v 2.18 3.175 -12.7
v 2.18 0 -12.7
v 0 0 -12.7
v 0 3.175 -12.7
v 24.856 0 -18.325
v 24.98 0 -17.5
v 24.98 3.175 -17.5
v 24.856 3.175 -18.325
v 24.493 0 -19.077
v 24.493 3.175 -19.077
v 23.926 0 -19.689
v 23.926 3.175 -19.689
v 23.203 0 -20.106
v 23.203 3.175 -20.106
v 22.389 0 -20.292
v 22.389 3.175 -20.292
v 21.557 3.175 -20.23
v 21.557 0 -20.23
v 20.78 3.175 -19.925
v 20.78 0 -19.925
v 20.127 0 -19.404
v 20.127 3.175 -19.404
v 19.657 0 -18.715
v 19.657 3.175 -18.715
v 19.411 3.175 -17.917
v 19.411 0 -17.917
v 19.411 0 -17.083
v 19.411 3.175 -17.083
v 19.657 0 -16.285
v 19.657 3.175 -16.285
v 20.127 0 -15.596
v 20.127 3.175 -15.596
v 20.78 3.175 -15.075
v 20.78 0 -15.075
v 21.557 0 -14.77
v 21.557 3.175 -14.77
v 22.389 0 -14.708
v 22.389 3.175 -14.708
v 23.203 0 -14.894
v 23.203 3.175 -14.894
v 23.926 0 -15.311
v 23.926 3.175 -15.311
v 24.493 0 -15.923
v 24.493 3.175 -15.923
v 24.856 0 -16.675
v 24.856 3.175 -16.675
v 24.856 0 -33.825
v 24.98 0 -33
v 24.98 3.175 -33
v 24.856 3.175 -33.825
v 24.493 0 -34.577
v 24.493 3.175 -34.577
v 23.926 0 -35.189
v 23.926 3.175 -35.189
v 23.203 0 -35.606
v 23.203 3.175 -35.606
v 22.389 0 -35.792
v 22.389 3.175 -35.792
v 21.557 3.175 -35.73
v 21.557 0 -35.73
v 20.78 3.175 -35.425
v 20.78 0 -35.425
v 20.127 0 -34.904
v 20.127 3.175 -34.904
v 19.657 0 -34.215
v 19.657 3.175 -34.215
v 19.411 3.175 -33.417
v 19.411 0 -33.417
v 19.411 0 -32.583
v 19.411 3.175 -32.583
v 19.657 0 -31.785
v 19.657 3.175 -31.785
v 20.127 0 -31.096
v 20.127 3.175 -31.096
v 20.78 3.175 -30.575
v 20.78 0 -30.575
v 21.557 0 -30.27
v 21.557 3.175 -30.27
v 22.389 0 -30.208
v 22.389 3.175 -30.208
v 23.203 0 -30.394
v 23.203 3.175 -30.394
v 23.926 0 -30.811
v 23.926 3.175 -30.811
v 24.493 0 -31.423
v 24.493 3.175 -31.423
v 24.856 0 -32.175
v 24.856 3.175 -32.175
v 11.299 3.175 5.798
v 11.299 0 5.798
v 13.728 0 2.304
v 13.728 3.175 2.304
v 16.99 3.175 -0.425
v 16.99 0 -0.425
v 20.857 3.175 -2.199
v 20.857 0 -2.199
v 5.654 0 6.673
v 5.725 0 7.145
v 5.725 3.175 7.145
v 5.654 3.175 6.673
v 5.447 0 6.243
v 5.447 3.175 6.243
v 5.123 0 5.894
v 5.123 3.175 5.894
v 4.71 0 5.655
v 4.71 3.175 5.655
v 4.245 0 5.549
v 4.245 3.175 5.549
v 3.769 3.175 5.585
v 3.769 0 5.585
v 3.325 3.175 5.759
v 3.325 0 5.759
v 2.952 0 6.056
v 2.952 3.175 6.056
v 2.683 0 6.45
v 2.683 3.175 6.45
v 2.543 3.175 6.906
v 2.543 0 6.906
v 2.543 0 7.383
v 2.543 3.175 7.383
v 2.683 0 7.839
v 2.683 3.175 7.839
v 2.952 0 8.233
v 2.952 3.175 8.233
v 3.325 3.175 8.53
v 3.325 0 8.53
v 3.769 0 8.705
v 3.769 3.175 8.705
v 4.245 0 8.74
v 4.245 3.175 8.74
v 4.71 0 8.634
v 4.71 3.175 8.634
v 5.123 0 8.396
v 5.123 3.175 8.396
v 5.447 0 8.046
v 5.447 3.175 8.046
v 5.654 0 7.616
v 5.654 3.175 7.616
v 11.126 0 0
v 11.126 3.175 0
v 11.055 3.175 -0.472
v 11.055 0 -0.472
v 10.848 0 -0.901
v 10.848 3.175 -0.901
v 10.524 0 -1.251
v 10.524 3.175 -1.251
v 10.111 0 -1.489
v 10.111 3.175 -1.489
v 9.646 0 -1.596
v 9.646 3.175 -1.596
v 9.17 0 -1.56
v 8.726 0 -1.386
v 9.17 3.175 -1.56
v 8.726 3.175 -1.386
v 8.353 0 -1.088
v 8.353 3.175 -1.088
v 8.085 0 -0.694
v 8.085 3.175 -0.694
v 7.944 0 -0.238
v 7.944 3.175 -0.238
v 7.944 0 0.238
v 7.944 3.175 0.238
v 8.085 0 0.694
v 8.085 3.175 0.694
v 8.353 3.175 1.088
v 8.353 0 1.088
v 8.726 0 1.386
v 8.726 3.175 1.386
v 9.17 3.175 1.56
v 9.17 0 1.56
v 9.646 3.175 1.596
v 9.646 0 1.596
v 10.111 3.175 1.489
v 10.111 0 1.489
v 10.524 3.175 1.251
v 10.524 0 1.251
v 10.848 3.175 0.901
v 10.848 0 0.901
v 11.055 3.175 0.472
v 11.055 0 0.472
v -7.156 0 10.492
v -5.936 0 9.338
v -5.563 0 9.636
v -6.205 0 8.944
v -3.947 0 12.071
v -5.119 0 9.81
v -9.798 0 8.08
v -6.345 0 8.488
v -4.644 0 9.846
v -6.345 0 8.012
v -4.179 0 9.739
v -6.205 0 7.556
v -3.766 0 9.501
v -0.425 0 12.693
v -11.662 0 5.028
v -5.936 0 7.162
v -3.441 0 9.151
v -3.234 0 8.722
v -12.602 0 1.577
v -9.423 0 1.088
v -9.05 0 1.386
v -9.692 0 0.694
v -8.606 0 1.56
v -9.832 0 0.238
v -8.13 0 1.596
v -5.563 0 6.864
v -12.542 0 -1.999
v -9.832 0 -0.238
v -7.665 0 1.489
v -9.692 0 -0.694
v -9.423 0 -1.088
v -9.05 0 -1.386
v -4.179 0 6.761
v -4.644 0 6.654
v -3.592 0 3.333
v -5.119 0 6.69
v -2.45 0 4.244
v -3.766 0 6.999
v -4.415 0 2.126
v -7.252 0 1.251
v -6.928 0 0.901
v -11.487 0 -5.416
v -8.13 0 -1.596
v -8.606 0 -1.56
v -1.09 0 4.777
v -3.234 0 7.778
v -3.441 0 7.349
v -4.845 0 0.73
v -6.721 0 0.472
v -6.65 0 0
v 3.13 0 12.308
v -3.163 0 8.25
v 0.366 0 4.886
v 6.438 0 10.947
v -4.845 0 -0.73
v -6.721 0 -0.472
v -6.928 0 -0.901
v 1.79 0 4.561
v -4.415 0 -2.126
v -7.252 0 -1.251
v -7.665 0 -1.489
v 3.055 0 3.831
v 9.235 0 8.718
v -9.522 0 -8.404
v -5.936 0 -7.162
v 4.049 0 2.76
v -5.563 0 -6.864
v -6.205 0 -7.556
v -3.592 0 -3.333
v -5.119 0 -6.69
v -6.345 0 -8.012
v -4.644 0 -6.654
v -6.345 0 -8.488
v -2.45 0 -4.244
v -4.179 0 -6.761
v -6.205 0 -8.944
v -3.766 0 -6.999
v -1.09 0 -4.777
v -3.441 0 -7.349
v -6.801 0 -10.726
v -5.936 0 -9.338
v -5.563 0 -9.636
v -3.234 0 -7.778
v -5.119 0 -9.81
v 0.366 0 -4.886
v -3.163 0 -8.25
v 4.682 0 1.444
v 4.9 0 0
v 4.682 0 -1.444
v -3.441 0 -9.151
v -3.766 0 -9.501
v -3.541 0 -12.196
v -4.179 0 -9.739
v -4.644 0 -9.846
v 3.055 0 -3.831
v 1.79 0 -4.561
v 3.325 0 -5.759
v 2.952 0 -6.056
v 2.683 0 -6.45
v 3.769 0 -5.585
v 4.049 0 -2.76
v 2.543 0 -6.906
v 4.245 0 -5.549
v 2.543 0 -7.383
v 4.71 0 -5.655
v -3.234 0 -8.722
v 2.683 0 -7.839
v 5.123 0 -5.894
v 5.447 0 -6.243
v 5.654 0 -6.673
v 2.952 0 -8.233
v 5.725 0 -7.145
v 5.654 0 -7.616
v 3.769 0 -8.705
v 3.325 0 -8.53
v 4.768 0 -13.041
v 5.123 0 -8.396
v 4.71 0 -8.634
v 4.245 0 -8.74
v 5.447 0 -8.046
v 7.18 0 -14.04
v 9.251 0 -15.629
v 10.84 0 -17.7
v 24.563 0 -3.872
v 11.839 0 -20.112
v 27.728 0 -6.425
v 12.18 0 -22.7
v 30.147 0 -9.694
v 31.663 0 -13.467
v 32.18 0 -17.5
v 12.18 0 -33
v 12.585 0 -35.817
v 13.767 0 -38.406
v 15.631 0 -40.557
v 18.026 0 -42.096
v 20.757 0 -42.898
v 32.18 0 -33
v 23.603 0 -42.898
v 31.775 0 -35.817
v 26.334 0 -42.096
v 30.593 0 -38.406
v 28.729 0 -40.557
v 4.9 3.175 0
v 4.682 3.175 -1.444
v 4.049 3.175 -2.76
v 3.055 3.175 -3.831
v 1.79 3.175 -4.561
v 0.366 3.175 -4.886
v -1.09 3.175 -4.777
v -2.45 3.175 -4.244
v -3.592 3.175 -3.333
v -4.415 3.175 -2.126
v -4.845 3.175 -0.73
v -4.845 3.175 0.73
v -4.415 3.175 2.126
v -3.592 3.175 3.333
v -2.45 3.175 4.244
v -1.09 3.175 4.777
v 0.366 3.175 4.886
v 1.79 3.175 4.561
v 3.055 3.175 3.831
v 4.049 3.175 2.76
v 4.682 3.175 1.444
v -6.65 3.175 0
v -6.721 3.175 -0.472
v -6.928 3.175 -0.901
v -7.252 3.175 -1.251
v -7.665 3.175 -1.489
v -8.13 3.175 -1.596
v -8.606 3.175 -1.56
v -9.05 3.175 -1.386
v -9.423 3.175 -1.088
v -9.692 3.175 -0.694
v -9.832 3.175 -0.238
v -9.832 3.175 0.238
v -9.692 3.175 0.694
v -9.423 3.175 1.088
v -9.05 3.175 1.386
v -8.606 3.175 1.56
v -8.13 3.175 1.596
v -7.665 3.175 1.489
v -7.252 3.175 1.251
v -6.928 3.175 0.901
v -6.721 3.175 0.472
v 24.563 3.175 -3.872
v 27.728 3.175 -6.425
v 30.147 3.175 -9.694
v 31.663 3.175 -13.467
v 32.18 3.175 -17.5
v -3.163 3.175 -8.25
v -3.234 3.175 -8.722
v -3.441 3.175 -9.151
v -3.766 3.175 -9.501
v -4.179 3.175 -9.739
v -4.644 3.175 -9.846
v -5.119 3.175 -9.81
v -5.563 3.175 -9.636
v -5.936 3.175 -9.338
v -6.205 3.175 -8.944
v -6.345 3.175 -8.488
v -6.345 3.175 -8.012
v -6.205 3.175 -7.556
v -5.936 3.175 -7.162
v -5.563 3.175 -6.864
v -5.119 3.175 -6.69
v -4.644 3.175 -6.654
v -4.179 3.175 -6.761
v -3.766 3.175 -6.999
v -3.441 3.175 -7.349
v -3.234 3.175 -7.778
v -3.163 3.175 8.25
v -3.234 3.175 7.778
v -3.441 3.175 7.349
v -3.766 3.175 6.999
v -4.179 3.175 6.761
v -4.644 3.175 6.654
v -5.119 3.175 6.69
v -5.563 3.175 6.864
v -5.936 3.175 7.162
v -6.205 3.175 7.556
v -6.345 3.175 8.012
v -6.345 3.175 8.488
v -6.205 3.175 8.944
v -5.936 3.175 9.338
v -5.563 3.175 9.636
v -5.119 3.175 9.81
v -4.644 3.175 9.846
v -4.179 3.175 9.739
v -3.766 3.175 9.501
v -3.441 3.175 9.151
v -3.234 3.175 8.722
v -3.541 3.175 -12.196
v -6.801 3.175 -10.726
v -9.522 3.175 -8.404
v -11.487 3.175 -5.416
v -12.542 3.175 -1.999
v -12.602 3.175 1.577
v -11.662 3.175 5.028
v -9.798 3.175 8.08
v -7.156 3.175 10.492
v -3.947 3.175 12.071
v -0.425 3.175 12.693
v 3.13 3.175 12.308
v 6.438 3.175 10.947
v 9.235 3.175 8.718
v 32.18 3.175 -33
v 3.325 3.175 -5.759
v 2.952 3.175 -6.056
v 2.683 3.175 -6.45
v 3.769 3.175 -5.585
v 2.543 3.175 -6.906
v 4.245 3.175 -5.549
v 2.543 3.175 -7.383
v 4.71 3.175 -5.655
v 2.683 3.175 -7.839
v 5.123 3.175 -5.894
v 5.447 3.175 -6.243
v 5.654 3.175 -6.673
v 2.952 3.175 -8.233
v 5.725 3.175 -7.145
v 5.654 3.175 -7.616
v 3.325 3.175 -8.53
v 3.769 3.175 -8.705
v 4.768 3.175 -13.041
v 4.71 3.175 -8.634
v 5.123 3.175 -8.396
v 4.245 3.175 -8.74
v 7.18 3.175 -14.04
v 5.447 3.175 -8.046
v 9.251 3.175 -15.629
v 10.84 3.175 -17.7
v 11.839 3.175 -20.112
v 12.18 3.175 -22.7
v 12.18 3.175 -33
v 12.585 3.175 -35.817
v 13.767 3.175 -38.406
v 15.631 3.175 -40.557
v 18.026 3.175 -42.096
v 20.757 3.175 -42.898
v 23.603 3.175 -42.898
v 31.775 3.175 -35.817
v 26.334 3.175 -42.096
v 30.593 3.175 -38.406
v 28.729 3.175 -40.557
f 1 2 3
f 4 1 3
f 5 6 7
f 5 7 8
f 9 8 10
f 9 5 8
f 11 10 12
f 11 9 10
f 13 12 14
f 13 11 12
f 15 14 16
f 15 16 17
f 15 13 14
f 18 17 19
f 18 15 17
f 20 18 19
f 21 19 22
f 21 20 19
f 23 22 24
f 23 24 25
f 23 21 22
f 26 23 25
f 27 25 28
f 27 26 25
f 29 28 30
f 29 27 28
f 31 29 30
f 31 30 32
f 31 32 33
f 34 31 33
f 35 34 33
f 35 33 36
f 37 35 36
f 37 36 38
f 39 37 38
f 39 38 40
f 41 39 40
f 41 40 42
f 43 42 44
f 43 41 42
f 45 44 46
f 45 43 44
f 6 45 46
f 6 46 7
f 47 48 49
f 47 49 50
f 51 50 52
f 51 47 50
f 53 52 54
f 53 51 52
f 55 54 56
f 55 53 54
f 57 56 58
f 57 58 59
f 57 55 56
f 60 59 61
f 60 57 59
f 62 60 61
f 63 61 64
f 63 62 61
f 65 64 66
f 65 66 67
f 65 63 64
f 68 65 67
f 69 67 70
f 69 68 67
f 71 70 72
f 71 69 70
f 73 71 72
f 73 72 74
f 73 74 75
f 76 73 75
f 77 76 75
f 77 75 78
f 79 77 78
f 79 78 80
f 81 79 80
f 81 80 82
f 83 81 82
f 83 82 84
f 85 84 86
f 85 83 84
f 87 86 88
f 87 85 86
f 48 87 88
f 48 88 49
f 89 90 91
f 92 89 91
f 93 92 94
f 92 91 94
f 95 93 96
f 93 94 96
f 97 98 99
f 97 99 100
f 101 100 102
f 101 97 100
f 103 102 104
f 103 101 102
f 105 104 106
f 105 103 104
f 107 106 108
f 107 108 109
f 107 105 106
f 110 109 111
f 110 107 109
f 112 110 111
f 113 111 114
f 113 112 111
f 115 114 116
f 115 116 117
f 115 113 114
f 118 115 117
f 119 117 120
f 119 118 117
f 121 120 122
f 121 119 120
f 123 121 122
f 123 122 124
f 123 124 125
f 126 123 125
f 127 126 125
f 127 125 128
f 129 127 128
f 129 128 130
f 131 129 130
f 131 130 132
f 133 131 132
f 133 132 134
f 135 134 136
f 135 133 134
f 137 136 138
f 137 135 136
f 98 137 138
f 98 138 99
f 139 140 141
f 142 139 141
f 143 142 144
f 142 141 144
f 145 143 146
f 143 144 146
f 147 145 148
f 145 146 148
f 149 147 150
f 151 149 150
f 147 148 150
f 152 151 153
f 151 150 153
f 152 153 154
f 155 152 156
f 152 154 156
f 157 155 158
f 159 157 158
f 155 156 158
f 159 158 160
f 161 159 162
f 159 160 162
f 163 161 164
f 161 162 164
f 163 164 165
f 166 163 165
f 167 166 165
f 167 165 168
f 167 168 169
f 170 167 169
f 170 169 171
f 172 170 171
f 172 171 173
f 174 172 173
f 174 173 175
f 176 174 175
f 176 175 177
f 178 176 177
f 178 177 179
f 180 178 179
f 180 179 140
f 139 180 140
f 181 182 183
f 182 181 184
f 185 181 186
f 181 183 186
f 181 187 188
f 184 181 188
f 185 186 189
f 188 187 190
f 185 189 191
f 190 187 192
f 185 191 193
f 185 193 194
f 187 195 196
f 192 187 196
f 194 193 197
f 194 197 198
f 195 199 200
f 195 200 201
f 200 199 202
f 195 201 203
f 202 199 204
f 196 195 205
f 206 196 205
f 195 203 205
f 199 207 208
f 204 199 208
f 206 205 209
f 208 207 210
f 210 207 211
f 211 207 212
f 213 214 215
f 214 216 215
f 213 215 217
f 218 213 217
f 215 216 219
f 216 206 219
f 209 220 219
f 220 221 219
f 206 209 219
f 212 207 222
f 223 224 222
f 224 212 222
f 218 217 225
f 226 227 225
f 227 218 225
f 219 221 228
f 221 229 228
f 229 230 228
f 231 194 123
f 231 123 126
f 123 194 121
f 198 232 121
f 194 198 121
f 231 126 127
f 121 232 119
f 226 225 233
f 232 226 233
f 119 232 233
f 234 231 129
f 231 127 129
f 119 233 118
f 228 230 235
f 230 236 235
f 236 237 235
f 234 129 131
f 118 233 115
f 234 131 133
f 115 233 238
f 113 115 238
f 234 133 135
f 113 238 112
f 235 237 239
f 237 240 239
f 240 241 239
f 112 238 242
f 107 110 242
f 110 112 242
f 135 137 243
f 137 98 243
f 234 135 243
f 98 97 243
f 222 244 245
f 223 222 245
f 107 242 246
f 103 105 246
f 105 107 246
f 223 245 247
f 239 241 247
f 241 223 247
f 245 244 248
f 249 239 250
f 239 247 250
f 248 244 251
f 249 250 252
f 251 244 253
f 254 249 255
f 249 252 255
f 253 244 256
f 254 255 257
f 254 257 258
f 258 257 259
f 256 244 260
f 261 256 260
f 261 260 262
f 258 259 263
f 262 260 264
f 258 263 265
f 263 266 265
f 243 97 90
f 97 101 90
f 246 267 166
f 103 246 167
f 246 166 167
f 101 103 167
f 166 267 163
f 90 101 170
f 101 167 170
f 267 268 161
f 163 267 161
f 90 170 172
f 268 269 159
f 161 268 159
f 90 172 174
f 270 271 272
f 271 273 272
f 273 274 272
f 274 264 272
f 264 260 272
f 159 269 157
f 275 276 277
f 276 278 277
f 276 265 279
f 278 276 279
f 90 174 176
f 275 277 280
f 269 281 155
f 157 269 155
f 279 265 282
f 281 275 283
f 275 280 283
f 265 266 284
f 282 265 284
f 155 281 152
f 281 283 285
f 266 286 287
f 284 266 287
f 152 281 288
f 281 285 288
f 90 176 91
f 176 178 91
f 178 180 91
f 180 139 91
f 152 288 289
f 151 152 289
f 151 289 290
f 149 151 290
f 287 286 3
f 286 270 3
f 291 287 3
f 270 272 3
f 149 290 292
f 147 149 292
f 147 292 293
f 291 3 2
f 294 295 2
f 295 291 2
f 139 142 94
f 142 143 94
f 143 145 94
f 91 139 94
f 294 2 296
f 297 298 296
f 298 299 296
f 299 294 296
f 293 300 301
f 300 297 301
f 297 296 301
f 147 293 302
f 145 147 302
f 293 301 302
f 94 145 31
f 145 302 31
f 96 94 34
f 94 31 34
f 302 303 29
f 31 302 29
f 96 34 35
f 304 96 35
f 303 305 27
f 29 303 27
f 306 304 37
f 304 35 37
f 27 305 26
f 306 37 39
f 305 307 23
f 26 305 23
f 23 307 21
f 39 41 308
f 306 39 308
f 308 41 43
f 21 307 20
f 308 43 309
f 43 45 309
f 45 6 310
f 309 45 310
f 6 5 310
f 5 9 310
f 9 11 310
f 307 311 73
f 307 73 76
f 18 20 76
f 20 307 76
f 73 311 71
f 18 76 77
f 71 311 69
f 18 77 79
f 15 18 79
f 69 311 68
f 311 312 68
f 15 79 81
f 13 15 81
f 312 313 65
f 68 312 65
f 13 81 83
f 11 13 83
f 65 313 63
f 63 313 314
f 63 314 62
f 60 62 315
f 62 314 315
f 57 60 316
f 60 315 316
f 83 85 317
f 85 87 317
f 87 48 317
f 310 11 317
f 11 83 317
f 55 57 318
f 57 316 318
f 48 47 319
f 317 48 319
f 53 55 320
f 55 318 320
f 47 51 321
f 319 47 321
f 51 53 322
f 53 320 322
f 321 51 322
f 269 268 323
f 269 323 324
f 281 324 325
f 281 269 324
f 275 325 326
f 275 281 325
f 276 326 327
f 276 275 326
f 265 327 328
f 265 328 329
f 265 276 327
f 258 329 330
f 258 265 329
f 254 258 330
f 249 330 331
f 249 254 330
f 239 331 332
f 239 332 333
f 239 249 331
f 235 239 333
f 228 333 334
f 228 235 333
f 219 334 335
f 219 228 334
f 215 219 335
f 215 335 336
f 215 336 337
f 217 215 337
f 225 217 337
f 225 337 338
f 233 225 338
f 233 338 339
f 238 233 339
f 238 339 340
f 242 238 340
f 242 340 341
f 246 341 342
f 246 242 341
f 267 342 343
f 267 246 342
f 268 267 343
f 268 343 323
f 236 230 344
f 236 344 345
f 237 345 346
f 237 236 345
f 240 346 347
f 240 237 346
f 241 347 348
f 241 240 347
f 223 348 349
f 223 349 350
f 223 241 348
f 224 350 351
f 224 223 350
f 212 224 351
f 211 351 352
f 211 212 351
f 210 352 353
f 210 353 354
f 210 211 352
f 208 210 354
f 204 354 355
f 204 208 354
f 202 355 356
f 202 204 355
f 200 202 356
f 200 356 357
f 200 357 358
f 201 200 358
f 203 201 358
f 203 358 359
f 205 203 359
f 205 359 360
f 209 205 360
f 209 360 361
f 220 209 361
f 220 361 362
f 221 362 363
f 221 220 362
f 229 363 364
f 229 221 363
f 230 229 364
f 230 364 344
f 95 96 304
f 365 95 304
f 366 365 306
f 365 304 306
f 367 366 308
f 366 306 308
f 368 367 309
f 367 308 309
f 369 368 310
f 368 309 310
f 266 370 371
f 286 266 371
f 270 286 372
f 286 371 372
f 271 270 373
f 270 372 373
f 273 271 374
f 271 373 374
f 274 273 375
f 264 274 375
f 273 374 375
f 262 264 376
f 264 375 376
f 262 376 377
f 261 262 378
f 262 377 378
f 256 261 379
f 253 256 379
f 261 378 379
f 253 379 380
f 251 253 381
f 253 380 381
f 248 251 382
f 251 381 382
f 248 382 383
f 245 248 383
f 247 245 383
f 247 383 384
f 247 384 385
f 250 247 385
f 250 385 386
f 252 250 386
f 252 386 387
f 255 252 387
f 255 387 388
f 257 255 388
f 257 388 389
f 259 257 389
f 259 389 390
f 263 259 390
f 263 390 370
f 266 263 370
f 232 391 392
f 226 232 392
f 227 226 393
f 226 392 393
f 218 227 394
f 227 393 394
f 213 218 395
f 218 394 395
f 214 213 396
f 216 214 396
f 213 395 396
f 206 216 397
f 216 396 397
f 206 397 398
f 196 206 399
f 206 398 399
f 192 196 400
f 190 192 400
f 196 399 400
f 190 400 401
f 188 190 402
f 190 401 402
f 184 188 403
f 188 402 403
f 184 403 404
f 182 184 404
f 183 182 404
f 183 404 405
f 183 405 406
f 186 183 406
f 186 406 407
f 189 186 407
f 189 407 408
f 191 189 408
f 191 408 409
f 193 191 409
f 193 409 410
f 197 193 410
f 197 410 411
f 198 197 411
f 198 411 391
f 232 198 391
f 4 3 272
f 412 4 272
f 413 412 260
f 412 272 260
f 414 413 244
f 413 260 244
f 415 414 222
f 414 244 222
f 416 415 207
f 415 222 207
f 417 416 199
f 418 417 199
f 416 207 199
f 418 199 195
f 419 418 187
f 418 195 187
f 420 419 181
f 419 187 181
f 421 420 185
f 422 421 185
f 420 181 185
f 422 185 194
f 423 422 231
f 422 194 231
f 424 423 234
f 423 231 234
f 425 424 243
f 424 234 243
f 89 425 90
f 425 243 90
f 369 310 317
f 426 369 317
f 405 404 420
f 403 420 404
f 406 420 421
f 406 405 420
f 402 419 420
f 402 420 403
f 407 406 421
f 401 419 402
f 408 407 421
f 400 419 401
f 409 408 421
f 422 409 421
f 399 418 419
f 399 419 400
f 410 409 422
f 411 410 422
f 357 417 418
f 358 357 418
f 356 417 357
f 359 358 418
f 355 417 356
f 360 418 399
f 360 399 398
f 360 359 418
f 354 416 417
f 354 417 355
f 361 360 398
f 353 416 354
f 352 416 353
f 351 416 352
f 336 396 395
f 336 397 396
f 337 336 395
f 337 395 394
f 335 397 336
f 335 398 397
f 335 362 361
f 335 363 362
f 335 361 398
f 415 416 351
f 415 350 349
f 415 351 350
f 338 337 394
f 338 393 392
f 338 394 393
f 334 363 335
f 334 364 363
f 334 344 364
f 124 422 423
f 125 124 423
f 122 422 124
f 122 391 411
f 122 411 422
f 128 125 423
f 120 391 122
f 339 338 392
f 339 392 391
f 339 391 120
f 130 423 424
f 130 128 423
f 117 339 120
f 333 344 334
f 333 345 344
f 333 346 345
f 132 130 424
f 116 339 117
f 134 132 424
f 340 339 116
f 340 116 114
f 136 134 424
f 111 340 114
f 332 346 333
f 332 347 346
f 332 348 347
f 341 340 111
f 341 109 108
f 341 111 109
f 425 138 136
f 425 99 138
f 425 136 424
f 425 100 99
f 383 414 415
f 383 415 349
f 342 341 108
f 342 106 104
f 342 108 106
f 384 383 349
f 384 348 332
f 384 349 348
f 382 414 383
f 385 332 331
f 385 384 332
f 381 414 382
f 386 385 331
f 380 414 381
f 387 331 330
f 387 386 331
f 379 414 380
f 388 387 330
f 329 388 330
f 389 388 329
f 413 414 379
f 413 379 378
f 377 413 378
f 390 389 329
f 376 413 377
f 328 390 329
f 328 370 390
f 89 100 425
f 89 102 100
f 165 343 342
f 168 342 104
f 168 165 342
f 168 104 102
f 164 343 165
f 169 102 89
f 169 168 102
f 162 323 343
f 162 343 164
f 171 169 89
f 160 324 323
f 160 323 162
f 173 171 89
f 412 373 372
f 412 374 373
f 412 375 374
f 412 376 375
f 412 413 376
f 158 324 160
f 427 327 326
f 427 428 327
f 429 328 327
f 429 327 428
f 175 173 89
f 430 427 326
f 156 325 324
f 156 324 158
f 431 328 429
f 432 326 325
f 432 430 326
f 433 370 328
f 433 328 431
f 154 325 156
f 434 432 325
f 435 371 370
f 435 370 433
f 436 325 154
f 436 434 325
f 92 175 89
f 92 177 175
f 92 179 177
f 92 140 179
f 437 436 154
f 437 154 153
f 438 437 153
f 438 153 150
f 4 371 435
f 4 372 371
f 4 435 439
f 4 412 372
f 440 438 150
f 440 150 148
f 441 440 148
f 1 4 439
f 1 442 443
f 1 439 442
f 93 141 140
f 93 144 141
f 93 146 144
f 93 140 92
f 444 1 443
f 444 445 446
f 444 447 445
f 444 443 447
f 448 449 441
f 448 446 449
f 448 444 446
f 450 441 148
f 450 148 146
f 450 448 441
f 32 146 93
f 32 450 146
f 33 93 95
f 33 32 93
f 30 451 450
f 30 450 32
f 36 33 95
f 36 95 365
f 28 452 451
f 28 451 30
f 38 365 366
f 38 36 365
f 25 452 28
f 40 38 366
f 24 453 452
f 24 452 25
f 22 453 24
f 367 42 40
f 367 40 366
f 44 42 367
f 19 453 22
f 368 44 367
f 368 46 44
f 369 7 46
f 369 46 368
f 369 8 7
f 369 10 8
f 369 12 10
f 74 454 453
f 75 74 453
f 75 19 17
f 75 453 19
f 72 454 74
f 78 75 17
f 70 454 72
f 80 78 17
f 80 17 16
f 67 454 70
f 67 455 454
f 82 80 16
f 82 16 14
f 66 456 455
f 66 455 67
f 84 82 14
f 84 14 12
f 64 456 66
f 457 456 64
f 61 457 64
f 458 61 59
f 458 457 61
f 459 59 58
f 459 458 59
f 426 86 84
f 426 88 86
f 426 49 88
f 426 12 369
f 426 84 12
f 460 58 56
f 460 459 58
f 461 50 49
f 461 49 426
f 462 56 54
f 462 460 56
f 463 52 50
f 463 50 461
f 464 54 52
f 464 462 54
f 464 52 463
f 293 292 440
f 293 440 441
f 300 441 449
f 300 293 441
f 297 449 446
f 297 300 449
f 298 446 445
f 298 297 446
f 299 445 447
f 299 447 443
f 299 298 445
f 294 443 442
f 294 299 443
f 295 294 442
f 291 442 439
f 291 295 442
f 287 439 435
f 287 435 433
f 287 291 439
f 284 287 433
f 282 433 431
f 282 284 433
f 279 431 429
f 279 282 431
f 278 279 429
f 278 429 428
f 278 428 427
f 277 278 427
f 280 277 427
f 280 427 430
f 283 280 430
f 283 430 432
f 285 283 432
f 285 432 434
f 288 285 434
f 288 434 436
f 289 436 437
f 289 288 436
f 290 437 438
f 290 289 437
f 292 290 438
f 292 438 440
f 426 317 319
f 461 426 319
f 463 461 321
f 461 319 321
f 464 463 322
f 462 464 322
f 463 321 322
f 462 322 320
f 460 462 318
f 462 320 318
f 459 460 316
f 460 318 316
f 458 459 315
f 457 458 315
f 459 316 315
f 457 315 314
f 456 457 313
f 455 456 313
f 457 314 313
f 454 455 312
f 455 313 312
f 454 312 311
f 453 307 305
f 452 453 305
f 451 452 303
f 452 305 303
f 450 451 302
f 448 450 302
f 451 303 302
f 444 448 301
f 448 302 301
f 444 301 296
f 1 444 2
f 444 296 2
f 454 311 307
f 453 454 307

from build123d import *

# Parameters (mm, degrees)
SKETCH1_R           = 2.8
SKETCH1_R_2         = 4.9
SKETCH1_R_3         = 1.6
BOSS_EXTRUDE1_DEPTH = 3.175
CUT_EXTRUDE1_REACH  = 5.175
SKETCH3_R           = 1.6


with BuildPart() as part:
    # Sketch1 → Boss-Extrude1 (new body)
    with BuildSketch(Plane(origin=(0, 0, 0), x_dir=(1, 0, 0), z_dir=(0, 1, 0))):
        with BuildLine():
            Line((12.18, 33), (12.18, 22.7))
            ThreePointArc((12.18, 22.7), (9.251067812, 15.628932188), (2.18, 12.7))
            Line((2.18, 12.7), (0, 12.7))
            ThreePointArc((0, 12.7), (-10.837940978, -6.620350093), (11.29936434, -5.797789709))
            ThreePointArc((11.29936434, -5.797789709), (15.26781807, -0.83060398), (20.857391991, 2.198954148))
            ThreePointArc((20.857391991, 2.198954148), (29.041537075, 7.982602032), (32.18, 17.5))
            Line((32.18, 17.5), (32.18, 33))
            ThreePointArc((32.18, 33), (22.18, 43), (12.18, 33))
        make_face()
        with Locations((22.18, 17.5)):
            Circle(SKETCH1_R, mode=Mode.SUBTRACT)
        with Locations((22.18, 33)):
            Circle(SKETCH1_R, mode=Mode.SUBTRACT)
        Circle(SKETCH1_R_2, mode=Mode.SUBTRACT)
        with Locations((-8.25, 0)):
            Circle(SKETCH1_R_3, mode=Mode.SUBTRACT)
        with Locations((4.125, 7.144709581)):
            Circle(SKETCH1_R_3, mode=Mode.SUBTRACT)
        with Locations((4.125, -7.144709581)):
            Circle(SKETCH1_R_3, mode=Mode.SUBTRACT)
    extrude(amount=BOSS_EXTRUDE1_DEPTH)

    # Sketch3 → Cut-Extrude1 (cut, up to next)
    with BuildSketch(Plane(origin=(0, 3.175, 0), x_dir=(1, 0, 0), z_dir=(0, 1, 0)), mode=Mode.PRIVATE) as cut_extrude1_sk1:
        with Locations((9.526279442, 0)):
            Circle(SKETCH3_R)
    cut_extrude1_tool1 = extrude(cut_extrude1_sk1.sketch, amount=-CUT_EXTRUDE1_REACH, mode=Mode.PRIVATE) & part.part
    add(cut_extrude1_tool1.solids().sort_by_distance((9.526279, 3.175, 0))[0], mode=Mode.SUBTRACT)
    # Sketch3 → Cut-Extrude1 (cut, up to next)
    with BuildSketch(Plane(origin=(0, 3.175, 0), x_dir=(1, 0, 0), z_dir=(0, 1, 0)), mode=Mode.PRIVATE) as cut_extrude1_sk2:
        with Locations((-4.763139721, -8.25)):
            Circle(SKETCH3_R)
    cut_extrude1_tool2 = extrude(cut_extrude1_sk2.sketch, amount=-CUT_EXTRUDE1_REACH, mode=Mode.PRIVATE) & part.part
    add(cut_extrude1_tool2.solids().sort_by_distance((-4.76314, 3.175, 8.25))[0], mode=Mode.SUBTRACT)
    # Sketch3 → Cut-Extrude1 (cut, up to next)
    with BuildSketch(Plane(origin=(0, 3.175, 0), x_dir=(1, 0, 0), z_dir=(0, 1, 0)), mode=Mode.PRIVATE) as cut_extrude1_sk3:
        with Locations((-4.763139721, 8.25)):
            Circle(SKETCH3_R)
    cut_extrude1_tool3 = extrude(cut_extrude1_sk3.sketch, amount=-CUT_EXTRUDE1_REACH, mode=Mode.PRIVATE) & part.part
    add(cut_extrude1_tool3.solids().sort_by_distance((-4.76314, 3.175, -8.25))[0], mode=Mode.SUBTRACT)


solid = part.part
